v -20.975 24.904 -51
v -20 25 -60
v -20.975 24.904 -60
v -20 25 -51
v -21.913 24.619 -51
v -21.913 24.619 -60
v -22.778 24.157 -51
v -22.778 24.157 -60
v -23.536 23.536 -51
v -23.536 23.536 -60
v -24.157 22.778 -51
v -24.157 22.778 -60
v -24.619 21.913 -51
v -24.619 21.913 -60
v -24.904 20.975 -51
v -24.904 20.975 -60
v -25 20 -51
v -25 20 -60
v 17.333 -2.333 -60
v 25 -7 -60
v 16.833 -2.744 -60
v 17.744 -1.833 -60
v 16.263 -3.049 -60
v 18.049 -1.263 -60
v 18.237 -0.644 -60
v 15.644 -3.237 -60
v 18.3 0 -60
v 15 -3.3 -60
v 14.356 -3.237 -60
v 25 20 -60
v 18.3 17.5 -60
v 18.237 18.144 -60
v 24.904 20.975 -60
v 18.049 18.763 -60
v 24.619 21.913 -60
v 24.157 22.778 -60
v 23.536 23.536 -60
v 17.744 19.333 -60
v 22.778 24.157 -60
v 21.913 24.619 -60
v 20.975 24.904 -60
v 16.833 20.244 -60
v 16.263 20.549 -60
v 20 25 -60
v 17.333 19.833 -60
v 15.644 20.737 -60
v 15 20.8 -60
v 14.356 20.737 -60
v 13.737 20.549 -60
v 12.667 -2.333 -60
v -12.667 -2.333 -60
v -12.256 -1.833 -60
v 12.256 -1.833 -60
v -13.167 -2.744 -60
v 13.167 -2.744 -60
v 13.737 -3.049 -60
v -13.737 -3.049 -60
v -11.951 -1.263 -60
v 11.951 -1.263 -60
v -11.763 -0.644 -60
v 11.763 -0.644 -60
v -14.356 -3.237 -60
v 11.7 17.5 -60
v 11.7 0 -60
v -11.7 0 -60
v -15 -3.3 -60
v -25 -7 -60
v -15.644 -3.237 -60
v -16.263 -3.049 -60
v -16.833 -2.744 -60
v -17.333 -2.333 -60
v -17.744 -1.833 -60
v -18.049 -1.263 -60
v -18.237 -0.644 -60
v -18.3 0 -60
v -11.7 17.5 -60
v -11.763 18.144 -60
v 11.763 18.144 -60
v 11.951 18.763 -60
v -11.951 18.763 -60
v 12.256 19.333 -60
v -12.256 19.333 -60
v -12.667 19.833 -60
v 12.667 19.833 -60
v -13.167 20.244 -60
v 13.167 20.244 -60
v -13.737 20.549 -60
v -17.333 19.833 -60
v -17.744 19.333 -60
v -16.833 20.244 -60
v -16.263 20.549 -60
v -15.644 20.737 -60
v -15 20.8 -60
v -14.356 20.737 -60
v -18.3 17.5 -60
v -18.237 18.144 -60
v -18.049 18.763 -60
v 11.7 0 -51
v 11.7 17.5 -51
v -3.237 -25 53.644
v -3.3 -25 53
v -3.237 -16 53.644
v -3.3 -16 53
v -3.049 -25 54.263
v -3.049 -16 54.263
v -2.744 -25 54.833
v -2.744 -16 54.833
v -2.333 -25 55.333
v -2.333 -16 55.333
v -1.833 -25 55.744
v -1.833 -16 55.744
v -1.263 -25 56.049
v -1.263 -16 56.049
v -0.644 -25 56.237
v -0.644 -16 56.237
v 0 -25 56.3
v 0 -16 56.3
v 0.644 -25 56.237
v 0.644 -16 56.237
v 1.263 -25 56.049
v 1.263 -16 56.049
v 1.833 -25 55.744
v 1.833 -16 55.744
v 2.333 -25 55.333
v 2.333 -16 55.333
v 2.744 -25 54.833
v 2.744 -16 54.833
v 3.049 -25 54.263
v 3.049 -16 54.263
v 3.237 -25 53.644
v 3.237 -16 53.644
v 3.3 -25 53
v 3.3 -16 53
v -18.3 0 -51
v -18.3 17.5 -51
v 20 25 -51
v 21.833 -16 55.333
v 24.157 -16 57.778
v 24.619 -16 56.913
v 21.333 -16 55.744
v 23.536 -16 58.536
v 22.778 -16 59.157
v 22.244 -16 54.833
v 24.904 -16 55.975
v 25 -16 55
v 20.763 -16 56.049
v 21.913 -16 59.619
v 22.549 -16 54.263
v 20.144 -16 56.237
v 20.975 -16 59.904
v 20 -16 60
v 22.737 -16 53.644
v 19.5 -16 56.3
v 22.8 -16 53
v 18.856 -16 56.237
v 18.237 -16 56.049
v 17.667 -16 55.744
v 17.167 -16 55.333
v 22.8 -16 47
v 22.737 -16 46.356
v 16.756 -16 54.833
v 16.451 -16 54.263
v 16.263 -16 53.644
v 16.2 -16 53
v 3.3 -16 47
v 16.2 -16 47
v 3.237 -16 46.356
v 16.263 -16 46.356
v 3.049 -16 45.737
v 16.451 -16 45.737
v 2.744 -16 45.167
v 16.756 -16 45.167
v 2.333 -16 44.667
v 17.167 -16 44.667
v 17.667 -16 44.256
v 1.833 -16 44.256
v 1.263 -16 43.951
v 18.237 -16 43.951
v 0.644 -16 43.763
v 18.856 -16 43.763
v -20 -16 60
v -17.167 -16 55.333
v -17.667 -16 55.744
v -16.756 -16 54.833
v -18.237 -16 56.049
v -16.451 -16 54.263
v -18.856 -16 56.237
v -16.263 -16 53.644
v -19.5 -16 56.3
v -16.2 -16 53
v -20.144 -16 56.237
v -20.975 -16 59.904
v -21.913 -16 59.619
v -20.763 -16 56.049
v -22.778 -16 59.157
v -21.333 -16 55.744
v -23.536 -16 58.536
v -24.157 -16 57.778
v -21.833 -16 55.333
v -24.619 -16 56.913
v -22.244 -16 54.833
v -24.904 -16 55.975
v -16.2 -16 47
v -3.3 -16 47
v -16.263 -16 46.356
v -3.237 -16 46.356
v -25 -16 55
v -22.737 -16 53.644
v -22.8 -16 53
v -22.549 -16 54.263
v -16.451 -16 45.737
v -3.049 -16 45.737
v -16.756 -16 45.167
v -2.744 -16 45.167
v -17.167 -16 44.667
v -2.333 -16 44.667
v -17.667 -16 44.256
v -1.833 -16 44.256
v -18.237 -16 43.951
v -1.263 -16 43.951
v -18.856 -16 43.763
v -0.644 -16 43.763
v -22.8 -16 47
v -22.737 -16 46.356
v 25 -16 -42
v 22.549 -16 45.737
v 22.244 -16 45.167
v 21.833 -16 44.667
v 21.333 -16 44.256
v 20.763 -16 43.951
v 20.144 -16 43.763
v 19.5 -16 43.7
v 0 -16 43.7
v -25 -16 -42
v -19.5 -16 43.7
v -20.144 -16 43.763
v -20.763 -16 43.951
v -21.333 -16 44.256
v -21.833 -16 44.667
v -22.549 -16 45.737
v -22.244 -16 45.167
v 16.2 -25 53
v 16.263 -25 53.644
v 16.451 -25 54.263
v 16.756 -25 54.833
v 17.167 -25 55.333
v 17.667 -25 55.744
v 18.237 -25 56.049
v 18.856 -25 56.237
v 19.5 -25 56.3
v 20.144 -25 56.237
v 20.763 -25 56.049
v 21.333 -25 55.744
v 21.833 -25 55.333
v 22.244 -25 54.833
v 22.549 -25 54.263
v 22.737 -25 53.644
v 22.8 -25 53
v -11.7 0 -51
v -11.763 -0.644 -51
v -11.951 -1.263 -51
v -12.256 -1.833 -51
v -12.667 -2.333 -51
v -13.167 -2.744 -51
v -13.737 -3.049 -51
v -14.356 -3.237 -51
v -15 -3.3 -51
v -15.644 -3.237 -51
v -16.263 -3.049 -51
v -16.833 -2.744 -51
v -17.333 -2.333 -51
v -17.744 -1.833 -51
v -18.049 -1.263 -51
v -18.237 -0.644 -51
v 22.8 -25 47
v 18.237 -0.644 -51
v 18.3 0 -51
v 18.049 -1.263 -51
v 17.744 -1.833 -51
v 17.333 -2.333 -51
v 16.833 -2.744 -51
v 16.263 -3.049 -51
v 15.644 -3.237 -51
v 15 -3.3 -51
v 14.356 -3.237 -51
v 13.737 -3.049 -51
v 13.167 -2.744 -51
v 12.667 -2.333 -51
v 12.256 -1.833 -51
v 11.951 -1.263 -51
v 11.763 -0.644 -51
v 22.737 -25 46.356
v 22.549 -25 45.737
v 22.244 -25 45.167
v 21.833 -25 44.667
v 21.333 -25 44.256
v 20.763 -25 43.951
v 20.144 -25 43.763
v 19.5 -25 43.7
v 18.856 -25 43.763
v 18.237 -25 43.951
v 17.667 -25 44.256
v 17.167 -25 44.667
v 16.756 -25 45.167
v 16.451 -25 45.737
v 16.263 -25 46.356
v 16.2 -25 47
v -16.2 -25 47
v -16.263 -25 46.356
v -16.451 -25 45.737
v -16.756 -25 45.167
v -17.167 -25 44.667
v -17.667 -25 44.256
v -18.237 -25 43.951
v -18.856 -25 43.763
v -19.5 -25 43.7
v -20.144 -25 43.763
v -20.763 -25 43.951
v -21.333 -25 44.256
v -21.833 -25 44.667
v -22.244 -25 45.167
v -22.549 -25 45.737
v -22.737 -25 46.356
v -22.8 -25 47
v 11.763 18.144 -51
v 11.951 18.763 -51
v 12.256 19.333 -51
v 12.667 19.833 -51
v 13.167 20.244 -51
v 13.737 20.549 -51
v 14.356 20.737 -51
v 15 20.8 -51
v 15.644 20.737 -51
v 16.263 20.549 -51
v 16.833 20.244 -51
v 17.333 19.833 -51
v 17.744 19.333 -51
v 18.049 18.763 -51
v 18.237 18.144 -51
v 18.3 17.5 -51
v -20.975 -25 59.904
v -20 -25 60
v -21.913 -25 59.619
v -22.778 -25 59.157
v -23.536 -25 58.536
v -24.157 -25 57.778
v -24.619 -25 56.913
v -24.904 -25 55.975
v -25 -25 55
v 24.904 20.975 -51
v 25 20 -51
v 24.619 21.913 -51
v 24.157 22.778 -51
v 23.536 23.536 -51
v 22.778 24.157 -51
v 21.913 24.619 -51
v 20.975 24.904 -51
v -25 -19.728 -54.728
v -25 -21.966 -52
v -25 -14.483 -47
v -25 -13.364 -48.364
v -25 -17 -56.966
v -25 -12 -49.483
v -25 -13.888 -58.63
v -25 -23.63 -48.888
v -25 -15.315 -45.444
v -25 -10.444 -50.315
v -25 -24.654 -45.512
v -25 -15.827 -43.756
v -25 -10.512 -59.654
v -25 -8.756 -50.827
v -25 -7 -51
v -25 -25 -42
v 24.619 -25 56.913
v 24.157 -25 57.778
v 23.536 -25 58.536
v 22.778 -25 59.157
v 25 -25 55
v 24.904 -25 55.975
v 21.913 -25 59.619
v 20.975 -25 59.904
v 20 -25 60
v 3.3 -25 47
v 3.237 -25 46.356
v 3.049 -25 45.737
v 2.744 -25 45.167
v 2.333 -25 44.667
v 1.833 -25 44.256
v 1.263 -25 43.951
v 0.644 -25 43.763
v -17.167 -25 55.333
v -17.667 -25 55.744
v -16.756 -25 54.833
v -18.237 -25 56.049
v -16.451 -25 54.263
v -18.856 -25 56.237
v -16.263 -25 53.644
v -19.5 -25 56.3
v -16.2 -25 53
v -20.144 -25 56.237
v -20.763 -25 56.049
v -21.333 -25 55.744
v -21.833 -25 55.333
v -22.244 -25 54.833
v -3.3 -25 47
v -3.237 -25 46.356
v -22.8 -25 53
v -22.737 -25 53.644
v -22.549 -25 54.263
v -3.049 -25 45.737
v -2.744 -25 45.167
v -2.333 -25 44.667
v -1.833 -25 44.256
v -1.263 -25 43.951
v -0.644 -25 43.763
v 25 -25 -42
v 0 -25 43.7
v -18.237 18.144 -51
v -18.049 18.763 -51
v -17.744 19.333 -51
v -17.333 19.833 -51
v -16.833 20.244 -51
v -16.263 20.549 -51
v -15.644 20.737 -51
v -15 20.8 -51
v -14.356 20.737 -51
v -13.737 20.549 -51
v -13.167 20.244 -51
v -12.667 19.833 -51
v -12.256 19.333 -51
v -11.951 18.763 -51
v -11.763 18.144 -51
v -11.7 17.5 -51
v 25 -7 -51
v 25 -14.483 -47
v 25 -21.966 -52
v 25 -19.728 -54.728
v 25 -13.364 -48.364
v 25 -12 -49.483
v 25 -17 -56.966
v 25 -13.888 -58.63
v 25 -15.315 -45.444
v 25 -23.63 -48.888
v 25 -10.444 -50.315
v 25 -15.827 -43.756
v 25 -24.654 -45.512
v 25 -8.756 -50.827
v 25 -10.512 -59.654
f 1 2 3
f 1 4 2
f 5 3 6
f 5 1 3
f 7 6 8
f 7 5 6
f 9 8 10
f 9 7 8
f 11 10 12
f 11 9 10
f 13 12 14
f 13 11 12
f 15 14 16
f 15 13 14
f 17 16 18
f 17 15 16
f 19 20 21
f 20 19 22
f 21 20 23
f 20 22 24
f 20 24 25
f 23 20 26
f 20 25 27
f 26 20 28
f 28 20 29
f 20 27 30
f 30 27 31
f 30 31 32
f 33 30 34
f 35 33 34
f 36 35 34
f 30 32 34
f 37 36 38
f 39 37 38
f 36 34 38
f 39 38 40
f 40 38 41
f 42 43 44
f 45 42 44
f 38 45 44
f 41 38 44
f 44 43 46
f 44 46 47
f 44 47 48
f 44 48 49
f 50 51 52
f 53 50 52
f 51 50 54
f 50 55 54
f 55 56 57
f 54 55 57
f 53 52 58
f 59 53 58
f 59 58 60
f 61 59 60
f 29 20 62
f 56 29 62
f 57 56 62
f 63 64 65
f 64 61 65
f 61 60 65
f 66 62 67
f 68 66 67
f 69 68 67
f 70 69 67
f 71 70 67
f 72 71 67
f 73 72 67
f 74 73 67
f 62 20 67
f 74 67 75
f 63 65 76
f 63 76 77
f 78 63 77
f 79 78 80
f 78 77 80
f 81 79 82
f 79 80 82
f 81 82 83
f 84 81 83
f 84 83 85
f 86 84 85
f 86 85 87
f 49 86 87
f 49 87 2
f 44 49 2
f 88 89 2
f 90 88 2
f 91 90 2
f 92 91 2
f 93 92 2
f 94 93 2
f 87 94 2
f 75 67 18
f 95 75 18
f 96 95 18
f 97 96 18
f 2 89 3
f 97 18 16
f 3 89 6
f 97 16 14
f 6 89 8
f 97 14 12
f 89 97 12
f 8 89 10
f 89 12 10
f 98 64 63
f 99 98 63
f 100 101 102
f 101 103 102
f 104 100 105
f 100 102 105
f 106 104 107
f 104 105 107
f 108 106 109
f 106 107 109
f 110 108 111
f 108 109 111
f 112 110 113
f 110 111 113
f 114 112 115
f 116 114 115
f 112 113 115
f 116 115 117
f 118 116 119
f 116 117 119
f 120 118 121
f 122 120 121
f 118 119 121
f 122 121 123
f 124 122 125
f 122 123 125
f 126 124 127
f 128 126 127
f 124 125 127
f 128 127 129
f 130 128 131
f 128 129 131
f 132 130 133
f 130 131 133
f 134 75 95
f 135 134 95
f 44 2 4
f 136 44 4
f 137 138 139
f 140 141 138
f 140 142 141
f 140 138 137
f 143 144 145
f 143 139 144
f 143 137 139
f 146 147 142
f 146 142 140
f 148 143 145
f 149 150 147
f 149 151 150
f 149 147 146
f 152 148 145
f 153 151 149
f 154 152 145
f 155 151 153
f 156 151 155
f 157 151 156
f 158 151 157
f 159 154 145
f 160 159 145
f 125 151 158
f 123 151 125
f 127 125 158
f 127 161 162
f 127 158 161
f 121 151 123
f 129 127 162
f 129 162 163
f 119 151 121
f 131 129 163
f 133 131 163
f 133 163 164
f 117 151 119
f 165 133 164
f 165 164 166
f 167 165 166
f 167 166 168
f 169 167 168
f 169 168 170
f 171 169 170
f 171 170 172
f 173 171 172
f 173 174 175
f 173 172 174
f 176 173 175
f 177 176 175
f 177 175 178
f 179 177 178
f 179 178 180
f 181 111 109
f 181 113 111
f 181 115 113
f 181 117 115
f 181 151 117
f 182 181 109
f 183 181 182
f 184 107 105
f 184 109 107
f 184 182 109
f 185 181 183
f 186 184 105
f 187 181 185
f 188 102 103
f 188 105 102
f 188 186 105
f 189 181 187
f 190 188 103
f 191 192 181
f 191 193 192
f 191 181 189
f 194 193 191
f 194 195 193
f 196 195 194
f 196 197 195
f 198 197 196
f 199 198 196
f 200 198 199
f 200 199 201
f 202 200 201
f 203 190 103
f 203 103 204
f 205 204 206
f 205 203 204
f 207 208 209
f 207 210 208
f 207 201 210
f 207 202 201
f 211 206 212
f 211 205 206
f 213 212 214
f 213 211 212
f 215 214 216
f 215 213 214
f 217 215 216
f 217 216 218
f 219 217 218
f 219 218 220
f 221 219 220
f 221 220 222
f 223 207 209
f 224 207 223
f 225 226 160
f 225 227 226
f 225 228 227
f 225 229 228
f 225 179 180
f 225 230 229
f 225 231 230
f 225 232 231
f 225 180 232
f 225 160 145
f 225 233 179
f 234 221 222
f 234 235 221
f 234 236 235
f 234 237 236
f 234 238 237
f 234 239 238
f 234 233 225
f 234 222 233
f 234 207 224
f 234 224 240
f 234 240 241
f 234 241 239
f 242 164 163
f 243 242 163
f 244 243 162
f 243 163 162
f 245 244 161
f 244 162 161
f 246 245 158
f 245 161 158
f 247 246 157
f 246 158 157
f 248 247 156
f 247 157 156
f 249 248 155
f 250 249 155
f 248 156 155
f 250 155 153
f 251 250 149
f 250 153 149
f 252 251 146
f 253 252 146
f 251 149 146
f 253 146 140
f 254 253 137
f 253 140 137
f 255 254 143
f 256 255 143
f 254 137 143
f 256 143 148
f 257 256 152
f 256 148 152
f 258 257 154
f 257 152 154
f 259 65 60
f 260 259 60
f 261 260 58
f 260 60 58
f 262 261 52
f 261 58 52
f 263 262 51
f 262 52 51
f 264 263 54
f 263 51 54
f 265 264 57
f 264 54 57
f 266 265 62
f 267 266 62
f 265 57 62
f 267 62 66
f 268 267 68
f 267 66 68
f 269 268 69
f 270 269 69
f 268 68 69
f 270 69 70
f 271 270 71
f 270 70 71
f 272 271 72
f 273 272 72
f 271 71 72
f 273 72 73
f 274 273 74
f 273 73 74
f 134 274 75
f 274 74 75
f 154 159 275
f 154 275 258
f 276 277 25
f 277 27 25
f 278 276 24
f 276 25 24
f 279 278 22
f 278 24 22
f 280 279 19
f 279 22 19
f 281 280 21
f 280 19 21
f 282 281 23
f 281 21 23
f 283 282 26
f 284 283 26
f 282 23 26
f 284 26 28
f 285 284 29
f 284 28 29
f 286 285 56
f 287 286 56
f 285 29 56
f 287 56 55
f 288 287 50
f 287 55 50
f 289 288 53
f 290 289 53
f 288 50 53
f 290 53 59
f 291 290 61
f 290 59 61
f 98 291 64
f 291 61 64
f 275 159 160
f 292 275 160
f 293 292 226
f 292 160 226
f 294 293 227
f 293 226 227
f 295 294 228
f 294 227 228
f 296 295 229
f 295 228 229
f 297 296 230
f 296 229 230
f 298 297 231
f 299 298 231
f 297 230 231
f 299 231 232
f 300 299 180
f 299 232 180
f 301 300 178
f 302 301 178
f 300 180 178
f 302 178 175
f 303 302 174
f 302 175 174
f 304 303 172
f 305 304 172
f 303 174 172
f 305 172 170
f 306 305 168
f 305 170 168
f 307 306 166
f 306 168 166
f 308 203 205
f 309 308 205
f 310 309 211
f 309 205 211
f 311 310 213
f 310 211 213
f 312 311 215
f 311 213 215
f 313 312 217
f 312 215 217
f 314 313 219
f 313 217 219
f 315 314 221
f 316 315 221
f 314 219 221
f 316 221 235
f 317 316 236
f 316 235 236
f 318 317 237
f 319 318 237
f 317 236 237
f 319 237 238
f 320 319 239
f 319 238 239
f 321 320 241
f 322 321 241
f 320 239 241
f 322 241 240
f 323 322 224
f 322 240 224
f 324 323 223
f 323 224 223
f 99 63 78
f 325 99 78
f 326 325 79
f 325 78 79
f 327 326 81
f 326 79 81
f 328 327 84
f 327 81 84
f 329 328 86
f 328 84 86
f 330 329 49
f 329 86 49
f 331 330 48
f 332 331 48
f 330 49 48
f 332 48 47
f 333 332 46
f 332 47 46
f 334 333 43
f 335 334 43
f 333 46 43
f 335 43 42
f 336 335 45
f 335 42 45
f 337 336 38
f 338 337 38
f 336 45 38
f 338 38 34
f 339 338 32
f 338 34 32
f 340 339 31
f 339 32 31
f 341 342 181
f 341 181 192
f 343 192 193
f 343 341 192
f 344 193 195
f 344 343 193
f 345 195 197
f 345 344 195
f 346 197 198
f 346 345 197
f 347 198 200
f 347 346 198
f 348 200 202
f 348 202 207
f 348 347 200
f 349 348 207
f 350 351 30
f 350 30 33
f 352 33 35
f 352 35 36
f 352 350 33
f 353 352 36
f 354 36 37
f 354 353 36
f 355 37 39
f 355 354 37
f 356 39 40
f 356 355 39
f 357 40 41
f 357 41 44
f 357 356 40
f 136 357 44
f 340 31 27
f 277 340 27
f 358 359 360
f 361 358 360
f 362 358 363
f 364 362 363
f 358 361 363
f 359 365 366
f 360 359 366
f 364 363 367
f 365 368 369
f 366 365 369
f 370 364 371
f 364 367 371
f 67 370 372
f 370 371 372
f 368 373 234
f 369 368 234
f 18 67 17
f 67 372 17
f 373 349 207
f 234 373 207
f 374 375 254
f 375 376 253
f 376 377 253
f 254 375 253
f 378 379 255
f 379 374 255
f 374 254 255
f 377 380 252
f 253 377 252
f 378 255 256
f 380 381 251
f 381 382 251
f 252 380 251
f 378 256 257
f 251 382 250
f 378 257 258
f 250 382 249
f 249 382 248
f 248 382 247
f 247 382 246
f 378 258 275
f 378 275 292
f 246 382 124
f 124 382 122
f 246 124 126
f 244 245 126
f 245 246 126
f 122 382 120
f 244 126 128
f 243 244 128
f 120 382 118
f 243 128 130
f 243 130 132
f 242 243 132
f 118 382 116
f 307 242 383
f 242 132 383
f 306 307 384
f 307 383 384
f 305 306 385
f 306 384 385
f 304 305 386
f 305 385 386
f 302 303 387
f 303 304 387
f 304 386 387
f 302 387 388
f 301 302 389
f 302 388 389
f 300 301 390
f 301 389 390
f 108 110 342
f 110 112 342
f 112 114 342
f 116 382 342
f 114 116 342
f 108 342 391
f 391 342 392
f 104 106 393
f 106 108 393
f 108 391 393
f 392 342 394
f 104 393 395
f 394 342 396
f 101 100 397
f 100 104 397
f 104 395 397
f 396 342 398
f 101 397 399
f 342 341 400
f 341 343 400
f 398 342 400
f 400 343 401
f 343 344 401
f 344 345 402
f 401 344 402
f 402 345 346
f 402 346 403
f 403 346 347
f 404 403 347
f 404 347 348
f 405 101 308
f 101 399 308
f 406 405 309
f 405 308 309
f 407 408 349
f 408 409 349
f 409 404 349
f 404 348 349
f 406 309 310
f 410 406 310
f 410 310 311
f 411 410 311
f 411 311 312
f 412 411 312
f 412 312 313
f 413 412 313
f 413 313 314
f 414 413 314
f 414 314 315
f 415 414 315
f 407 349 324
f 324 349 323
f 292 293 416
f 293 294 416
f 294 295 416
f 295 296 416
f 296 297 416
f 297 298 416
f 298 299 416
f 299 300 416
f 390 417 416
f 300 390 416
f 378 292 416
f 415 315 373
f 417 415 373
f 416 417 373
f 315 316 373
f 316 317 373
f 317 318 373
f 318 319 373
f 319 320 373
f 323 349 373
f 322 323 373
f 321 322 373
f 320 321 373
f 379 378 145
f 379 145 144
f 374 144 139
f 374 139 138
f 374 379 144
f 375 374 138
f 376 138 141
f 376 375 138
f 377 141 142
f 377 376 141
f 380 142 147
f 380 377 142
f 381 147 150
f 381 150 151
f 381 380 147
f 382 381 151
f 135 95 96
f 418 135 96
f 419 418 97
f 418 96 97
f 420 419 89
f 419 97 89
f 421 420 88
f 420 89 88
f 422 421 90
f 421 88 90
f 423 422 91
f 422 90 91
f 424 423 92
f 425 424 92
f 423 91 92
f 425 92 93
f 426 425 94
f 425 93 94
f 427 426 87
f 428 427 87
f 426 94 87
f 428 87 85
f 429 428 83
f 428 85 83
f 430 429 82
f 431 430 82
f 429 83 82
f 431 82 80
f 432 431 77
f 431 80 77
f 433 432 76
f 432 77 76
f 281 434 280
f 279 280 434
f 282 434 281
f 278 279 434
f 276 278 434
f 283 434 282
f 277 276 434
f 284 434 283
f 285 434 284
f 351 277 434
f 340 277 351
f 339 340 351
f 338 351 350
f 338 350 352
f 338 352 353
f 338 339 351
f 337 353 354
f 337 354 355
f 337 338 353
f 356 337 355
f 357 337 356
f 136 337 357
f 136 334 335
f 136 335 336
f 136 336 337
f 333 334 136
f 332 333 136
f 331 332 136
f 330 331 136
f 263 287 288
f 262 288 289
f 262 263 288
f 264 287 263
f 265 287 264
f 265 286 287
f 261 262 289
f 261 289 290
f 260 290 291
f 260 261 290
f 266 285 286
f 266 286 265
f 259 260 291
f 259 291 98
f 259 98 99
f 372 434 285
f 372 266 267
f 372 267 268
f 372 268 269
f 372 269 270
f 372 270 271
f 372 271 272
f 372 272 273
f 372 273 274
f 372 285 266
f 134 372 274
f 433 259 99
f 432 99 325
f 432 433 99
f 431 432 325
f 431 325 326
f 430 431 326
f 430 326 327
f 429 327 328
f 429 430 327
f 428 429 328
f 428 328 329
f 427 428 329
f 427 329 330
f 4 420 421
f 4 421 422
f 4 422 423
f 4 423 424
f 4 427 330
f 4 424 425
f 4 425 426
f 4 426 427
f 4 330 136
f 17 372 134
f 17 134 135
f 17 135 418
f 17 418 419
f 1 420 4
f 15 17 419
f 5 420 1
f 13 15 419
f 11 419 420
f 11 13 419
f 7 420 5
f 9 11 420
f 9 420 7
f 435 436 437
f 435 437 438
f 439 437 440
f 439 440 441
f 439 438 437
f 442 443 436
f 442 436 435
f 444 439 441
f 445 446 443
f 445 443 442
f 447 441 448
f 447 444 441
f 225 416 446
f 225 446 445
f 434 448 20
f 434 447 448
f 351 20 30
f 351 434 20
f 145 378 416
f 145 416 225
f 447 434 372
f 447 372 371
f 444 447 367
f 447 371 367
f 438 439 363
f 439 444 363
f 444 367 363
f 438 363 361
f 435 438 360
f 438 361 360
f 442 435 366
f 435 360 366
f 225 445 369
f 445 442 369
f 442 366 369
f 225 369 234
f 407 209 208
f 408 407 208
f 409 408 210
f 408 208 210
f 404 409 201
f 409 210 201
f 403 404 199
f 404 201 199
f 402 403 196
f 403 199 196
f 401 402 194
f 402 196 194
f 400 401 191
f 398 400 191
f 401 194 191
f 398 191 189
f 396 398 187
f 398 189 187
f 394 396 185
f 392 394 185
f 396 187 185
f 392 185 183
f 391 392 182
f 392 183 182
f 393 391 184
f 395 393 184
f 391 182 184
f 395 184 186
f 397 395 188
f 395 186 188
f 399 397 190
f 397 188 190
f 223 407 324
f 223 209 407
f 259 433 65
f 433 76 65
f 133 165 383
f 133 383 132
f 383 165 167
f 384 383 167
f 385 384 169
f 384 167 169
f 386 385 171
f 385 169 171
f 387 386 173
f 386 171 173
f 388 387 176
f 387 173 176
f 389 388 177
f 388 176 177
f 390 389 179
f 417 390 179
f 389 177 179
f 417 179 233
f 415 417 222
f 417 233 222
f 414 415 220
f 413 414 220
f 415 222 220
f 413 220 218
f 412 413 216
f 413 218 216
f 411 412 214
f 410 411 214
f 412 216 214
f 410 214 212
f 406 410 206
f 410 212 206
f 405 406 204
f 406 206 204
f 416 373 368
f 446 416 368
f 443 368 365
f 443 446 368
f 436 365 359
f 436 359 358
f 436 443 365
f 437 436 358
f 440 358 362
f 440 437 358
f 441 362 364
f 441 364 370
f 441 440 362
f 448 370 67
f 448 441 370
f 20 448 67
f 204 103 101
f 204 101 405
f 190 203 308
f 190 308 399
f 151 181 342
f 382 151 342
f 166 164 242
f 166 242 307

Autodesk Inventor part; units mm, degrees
ref_plane "YZ Plane" through (0, 0, 0) normal (1, 0, 0) x (0, 1, 0)
ref_plane "XZ Plane" through (0, 0, 0) normal (0, 1, 0) x (-1, 0, 0)
ref_plane "XY Plane" through (0, 0, 0) normal (0, 0, 1) x (1, 0, 0)
sketch "Sketch2" plane through (0, 0, 0) normal (1, 0, 0) x (0, 1, 0)
  line L0 (-25, 60) -> (-25, -60)
  line L1 (-25, -60) -> (25, -60)
  line L2 (-16, 60) -> (-16, -51)
  line L3 (-16, -51) -> (25, -51)
  line L4 (-16, 60) -> (-25, 60)
  line L5 (25, -60) -> (25, -51)
  point P0 (0, 0)
  point P1 (-25, 0)
  point P2 (0, -60)
  dimension "d1" = 120
  dimension "d2" = 50
  dimension "t" = 9
extrude "Extrusion1" add sketch "Sketch2" along normal mid plane 50
fillet "Fillet1" radius 9 1 edges at (0, -16, -51)
fillet "Fillet1" radius 18 1 edges at (0, -25, -60)
sketch "Sketch3" plane through (-25, -25, 60) normal (0, -1, 0) x (1, 0, 0)
  line L0 (50, 0) -> (0, 0) projected
  line L1 (0, -102) -> (0, 0) projected
  line L2 (50, 0) -> (50, -102) projected
  line L3 (5.5, -13) -> (5.5, -7) construction
  line L4 (8.8, -13) -> (8.8, -7)
  line L5 (2.2, -7) -> (2.2, -13)
  arc A0 (2.2, -13) -> (8.8, -13) centre (5.5, -13) ccw
  arc A1 (8.8, -7) -> (2.2, -7) centre (5.5, -7) ccw
  line L6 (25, -13) -> (25, -7) construction
  line L7 (28.3, -13) -> (28.3, -7)
  line L8 (21.7, -7) -> (21.7, -13)
  arc A2 (21.7, -13) -> (28.3, -13) centre (25, -13) ccw
  arc A3 (28.3, -7) -> (21.7, -7) centre (25, -7) ccw
  line L9 (44.5, -13) -> (44.5, -7) construction
  line L10 (47.8, -13) -> (47.8, -7)
  line L11 (41.2, -7) -> (41.2, -13)
  arc A4 (41.2, -13) -> (47.8, -13) centre (44.5, -13) ccw
  arc A5 (47.8, -7) -> (41.2, -7) centre (44.5, -7) ccw
  point P0 (25, -60)
  point P1 (5.5, -10)
  point P2 (25, -10)
  point P3 (44.5, -10)
  dimension "d8" = 10
  dimension "d9" = 5.5
  dimension "d10" = 5.5
  dimension "d11" = 39
  dimension "d12" = 19.5
  dimension "d29" = 3
  dimension "d30" = 6.6
  dimension "d31" = 6.6
sketch "Sketch4" plane through (-25, 25, -51) normal (0, 0, 1) x (1, 0, 0)
  line L0 (10, -7.5) -> (10, -25) construction
  line L1 (13.3, -7.5) -> (13.3, -25)
  line L2 (6.7, -25) -> (6.7, -7.5)
  arc A0 (13.3, -7.5) -> (6.7, -7.5) centre (10, -7.5) ccw
  arc A1 (6.7, -25) -> (13.3, -25) centre (10, -25) ccw
  line L3 (0, -32) -> (0, 0) projected
  line L4 (0, 0) -> (50, 0) projected
  line L5 (40, -7.5) -> (40, -25) construction
  line L6 (43.3, -7.5) -> (43.3, -25)
  line L7 (36.7, -25) -> (36.7, -7.5)
  arc A2 (43.3, -7.5) -> (36.7, -7.5) centre (40, -7.5) ccw
  arc A3 (36.7, -25) -> (43.3, -25) centre (40, -25) ccw
  point P0 (25, -25)
  point P1 (10, -16.25)
  point P2 (40, -16.25)
  dimension "d21" = 10
  dimension "d22" = 17.5
  dimension "d24" = 6.6
  dimension "d27" = 30
  dimension "d28" = 7.5
extrude "Extrusion2" cut sketch "Sketch4" along normal through all both and the other way through all
extrude "Extrusion3" cut sketch "Sketch3" along normal through all both and the other way through all
fillet "Fillet2" radius 5 4 edges at (-25, -20.5, 60) (25, -20.5, 60) (25, 25, -55.5) (-25, 25, -55.5)
equation "\"d6\" = t"
equation "\"d7\" = 2 * t"
equation "\"d10\" = d9"
equation "\"d12\" = 0.5 * d11"
properties part number "TL20240701-10200AT-005" material "SS400"
